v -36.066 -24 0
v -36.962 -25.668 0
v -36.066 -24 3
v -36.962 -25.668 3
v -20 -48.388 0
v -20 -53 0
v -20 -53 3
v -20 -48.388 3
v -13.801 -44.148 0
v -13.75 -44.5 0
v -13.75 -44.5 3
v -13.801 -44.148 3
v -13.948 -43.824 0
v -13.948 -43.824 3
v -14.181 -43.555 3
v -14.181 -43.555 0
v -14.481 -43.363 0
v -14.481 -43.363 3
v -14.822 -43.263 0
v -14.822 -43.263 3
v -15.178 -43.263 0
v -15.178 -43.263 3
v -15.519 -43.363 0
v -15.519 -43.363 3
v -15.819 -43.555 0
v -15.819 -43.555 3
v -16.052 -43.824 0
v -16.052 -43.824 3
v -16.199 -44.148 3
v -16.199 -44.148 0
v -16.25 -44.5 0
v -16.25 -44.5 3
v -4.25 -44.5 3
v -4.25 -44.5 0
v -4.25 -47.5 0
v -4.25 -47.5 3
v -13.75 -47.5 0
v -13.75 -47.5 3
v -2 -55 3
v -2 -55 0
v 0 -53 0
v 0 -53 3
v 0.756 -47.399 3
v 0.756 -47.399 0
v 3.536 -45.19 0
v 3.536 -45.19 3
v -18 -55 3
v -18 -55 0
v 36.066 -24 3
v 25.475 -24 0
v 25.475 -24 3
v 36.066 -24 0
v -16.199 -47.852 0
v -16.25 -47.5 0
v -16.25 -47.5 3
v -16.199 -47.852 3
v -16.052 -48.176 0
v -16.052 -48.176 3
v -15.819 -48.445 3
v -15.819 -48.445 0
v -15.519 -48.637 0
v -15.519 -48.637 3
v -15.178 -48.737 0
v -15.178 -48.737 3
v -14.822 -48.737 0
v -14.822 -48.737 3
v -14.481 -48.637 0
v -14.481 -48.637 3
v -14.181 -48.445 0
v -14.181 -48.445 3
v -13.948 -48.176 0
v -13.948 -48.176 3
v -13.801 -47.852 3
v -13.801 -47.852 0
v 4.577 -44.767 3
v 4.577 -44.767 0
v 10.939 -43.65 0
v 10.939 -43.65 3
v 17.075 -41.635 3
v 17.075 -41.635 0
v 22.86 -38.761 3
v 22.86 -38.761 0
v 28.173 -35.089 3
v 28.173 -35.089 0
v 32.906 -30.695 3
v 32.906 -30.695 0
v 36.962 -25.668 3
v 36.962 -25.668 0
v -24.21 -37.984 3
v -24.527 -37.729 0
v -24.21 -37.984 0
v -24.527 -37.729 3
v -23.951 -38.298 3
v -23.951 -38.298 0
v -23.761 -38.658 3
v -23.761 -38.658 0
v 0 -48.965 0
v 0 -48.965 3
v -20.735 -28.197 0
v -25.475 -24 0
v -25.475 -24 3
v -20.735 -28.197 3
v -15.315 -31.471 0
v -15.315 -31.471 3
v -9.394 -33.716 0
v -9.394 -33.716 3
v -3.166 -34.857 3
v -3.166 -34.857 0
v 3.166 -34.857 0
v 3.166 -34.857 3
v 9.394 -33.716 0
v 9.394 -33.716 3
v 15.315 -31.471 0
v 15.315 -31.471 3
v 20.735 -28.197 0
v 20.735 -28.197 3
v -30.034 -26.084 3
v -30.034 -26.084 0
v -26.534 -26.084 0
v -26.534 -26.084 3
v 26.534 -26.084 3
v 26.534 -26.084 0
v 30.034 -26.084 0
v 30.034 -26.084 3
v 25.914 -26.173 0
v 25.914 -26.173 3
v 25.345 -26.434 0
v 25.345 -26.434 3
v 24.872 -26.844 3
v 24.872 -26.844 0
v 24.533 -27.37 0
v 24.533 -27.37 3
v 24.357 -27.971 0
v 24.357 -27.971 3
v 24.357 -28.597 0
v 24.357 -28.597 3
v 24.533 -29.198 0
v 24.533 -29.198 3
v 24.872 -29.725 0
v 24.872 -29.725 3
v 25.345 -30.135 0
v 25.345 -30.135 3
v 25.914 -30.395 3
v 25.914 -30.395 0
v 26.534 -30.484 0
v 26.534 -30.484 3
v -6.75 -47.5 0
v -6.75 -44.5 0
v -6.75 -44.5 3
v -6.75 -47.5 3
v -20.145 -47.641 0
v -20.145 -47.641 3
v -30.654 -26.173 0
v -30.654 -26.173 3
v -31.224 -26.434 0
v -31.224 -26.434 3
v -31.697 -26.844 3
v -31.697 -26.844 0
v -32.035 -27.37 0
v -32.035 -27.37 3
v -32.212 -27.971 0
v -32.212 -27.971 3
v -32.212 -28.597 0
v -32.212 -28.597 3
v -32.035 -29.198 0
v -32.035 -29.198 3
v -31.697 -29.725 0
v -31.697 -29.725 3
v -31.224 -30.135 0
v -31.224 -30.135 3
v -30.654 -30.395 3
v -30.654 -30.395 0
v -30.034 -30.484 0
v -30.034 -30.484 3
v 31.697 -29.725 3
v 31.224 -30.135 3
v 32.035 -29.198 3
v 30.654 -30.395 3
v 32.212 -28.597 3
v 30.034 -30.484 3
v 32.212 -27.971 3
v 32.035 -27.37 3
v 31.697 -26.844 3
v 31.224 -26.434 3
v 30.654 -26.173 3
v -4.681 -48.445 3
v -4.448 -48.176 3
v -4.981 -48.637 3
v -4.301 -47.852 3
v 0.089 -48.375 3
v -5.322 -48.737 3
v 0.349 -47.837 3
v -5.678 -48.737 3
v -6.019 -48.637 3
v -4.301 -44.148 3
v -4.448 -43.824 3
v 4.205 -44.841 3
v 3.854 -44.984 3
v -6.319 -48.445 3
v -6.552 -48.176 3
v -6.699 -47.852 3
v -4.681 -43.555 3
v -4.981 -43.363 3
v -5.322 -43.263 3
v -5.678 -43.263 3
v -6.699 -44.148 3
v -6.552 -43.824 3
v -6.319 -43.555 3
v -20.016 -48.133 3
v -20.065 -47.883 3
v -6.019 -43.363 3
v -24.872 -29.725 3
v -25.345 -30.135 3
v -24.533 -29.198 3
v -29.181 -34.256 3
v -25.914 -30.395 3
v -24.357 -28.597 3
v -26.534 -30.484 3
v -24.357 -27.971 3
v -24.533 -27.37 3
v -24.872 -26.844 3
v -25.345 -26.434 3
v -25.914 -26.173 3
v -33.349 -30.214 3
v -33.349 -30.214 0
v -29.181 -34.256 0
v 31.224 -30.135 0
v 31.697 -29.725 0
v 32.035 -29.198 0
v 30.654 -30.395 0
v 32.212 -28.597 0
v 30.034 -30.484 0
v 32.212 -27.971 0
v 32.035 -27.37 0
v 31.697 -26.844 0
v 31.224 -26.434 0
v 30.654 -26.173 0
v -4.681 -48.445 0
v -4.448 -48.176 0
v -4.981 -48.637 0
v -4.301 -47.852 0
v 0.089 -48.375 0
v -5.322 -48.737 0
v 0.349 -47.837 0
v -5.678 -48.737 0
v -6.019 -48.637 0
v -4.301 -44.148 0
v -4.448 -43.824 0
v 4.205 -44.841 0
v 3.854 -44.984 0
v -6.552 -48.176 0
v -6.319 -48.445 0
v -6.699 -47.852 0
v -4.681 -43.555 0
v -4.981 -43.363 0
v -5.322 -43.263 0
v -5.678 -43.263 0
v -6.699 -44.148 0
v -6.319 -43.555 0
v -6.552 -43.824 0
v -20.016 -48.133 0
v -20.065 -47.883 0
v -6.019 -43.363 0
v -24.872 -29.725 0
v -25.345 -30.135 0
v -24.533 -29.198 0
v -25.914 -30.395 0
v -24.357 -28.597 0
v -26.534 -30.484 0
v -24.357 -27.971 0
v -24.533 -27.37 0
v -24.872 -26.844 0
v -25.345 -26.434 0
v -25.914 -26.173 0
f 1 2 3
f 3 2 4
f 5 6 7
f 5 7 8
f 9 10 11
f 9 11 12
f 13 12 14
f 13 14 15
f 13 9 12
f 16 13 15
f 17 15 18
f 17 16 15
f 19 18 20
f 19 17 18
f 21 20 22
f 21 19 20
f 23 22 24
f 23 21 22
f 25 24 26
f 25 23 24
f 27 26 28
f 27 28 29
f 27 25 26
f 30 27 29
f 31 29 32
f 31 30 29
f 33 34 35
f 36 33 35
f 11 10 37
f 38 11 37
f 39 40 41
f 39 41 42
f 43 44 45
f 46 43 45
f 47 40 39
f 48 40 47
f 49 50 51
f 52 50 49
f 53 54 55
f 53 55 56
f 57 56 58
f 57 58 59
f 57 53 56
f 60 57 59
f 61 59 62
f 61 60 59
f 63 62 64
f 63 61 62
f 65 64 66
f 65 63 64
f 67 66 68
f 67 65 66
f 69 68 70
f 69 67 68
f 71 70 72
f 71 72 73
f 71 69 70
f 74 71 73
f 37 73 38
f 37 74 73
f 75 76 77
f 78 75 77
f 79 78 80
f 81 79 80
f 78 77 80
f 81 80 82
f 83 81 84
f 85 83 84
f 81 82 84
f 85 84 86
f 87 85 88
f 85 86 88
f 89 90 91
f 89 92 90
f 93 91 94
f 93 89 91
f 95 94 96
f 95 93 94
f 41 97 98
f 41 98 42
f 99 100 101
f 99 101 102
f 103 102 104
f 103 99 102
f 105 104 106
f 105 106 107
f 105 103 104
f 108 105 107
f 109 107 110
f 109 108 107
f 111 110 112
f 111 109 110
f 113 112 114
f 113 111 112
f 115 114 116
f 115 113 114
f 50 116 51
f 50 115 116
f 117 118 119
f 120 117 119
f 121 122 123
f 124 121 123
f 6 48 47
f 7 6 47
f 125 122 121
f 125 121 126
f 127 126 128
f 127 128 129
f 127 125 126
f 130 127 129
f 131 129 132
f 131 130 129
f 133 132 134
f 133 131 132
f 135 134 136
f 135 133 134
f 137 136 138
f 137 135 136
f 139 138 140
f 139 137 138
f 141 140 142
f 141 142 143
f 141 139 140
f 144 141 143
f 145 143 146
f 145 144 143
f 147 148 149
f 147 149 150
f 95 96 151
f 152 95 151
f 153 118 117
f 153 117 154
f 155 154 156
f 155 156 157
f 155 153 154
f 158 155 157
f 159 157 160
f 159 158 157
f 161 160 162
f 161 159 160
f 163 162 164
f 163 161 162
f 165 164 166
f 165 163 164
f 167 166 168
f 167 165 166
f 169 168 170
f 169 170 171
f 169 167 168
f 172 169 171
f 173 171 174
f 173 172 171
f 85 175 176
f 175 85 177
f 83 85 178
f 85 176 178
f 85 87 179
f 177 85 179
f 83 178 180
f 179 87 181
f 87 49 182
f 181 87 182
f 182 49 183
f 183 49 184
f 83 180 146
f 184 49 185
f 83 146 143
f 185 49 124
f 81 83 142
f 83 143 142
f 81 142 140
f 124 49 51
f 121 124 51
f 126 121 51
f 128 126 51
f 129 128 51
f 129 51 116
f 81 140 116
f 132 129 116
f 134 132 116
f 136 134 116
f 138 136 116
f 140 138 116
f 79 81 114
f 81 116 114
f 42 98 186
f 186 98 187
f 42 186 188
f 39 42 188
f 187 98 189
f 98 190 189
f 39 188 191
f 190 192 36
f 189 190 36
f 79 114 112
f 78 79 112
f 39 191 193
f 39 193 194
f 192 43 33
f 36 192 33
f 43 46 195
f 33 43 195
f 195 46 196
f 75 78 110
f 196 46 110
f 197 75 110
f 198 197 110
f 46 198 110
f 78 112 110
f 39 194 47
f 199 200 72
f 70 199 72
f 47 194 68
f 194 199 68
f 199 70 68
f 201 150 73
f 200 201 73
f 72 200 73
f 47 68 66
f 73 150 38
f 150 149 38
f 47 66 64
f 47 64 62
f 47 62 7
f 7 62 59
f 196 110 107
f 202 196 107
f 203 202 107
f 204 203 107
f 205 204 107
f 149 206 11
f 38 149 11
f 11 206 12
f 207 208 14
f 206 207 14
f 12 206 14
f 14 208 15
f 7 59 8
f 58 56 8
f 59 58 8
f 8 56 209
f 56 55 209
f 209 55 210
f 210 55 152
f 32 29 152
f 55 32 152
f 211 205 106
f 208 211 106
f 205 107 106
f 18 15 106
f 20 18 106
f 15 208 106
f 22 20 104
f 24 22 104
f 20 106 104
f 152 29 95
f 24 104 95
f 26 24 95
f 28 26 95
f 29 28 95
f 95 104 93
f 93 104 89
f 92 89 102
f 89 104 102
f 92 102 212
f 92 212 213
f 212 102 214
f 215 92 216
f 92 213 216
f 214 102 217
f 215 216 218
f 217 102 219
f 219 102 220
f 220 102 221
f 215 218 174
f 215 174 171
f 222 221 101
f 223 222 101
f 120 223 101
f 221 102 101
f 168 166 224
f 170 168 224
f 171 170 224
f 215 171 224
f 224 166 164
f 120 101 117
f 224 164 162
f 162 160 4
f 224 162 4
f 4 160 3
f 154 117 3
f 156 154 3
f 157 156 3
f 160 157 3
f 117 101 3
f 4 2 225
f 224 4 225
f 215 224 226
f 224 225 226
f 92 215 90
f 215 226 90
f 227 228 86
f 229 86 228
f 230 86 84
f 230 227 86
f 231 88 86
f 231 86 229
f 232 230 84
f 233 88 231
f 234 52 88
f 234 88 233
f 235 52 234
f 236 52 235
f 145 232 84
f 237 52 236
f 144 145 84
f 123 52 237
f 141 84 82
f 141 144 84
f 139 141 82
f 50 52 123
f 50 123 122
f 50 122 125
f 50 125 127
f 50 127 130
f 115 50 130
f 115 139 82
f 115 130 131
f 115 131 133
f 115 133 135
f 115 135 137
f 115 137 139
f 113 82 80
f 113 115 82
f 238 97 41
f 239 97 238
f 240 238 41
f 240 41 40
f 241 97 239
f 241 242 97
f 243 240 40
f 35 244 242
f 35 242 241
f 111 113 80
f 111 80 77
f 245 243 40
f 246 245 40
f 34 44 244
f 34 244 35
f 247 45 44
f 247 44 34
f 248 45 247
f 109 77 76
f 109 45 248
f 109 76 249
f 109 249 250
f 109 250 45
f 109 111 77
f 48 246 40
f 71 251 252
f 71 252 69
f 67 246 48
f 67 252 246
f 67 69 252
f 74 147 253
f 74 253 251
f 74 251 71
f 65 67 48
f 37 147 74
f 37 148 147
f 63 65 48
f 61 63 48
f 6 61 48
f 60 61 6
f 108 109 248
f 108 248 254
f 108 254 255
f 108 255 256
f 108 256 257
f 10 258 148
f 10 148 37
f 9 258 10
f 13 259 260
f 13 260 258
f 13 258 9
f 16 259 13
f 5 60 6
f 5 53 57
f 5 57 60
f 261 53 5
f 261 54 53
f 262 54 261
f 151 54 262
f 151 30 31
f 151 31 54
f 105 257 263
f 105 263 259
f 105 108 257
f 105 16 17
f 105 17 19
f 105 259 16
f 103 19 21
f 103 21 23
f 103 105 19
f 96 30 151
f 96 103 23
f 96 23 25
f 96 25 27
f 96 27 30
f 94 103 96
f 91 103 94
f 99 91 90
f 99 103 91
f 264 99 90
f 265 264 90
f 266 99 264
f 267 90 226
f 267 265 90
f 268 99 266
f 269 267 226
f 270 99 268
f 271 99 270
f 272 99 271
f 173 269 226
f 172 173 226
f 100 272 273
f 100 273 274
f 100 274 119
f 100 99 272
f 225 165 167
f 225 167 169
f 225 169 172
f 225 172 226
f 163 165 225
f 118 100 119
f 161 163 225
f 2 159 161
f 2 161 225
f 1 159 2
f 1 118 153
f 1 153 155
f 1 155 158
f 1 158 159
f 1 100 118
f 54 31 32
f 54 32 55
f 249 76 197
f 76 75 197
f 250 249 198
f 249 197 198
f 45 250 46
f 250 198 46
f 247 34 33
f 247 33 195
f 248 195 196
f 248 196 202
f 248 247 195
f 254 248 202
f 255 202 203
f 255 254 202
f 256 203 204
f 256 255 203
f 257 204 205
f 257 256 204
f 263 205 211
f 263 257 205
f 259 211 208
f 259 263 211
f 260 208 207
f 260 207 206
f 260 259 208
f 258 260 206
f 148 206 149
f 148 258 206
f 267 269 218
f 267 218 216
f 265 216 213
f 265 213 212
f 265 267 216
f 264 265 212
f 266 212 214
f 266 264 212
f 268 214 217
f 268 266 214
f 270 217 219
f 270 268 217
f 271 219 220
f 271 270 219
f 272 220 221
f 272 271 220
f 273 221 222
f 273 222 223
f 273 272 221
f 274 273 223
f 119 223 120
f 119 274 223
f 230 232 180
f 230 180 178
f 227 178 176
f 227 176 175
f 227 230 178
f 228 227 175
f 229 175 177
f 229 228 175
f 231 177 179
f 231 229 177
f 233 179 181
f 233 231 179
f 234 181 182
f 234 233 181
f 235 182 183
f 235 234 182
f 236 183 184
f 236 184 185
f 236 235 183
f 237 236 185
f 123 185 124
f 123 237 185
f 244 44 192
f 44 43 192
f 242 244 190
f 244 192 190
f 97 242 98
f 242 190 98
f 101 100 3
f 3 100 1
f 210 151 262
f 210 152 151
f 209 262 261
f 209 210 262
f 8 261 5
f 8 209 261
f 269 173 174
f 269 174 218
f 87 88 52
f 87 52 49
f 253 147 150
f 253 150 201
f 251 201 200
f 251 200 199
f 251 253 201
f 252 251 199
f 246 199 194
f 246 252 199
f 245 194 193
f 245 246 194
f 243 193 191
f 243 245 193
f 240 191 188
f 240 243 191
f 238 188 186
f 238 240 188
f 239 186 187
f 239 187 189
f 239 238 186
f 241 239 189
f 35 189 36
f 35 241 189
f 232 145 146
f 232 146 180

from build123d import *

# Parameters (mm, degrees)
PAD_DEPTH    = 3
CHAMFER_SIZE = 2
FILLET_R     = 2


with BuildPart() as part:
    # Sketch → Pad (new body)
    with BuildSketch(Plane.XY):
        with BuildLine():
            ThreePointArc((-25.475478, -24), (0, -35), (25.475478, -24))
            Line((25.475478, -24), (38.065733, -24))
            ThreePointArc((4, -44.82187), (23.468469, -38.395716), (38.065733, -24))
            Line((0, -48), (4, -44.82187))
            Line((0, -48), (0, -55))
            Line((0, -55), (-20, -55))
            Line((-20, -55), (-20, -48))
            Line((-24, -38.065733), (-20, -48))
            ThreePointArc((-38.065733, -24), (-31.819805, -31.819805), (-24, -38.065733))
            Line((-25.475478, -24), (-38.065733, -24))
        make_face()
        with BuildLine():
            ThreePointArc((-30.034271, -26.084271), (-32.234271, -28.284271), (-30.034271, -30.484271))
            Line((-30.034271, -30.484271), (-26.534271, -30.484271))
            ThreePointArc((-26.534271, -30.484271), (-24.334271, -28.284271), (-26.534271, -26.084271))
            Line((-30.034271, -26.084271), (-26.534271, -26.084271))
        make_face(mode=Mode.SUBTRACT)
        with BuildLine():
            ThreePointArc((26.534271, -26.084271), (24.334271, -28.284271), (26.534271, -30.484271))
            Line((26.534271, -30.484271), (30.034271, -30.484271))
            ThreePointArc((30.034271, -30.484271), (32.234271, -28.284271), (30.034271, -26.084271))
            Line((26.534271, -26.084271), (30.034271, -26.084271))
        make_face(mode=Mode.SUBTRACT)
        with BuildLine():
            ThreePointArc((-4.25, -44.5), (-5.5, -43.25), (-6.75, -44.5))
            Line((-6.75, -44.5), (-6.75, -47.5))
            ThreePointArc((-6.75, -47.5), (-5.5, -48.75), (-4.25, -47.5))
            Line((-4.25, -44.5), (-4.25, -47.5))
        make_face(mode=Mode.SUBTRACT)
        with BuildLine():
            ThreePointArc((-13.75, -44.5), (-15, -43.25), (-16.25, -44.5))
            Line((-16.25, -44.5), (-16.25, -47.5))
            ThreePointArc((-16.25, -47.5), (-15, -48.75), (-13.75, -47.5))
            Line((-13.75, -44.5), (-13.75, -47.5))
        make_face(mode=Mode.SUBTRACT)
    extrude(amount=PAD_DEPTH)

    # Chamfer
    chamfer_edges = [part.edges().sort_by_distance(p)[0] for p in [
        (0, -55, 1.5),
        (38.065733, -24, 1.5),
        (-38.065733, -24, 1.5),
        (-20, -55, 1.5),
    ]]
    chamfer(chamfer_edges, length=CHAMFER_SIZE)

    # Fillet
    fillet_edges = [part.edges().sort_by_distance(p)[0] for p in [
        (-20, -48, 1.5),
        (-24, -38.065733, 1.5),
        (0, -48, 1.5),
        (4, -44.82187, 1.5),
    ]]
    fillet(fillet_edges, radius=FILLET_R)


solid = part.part
